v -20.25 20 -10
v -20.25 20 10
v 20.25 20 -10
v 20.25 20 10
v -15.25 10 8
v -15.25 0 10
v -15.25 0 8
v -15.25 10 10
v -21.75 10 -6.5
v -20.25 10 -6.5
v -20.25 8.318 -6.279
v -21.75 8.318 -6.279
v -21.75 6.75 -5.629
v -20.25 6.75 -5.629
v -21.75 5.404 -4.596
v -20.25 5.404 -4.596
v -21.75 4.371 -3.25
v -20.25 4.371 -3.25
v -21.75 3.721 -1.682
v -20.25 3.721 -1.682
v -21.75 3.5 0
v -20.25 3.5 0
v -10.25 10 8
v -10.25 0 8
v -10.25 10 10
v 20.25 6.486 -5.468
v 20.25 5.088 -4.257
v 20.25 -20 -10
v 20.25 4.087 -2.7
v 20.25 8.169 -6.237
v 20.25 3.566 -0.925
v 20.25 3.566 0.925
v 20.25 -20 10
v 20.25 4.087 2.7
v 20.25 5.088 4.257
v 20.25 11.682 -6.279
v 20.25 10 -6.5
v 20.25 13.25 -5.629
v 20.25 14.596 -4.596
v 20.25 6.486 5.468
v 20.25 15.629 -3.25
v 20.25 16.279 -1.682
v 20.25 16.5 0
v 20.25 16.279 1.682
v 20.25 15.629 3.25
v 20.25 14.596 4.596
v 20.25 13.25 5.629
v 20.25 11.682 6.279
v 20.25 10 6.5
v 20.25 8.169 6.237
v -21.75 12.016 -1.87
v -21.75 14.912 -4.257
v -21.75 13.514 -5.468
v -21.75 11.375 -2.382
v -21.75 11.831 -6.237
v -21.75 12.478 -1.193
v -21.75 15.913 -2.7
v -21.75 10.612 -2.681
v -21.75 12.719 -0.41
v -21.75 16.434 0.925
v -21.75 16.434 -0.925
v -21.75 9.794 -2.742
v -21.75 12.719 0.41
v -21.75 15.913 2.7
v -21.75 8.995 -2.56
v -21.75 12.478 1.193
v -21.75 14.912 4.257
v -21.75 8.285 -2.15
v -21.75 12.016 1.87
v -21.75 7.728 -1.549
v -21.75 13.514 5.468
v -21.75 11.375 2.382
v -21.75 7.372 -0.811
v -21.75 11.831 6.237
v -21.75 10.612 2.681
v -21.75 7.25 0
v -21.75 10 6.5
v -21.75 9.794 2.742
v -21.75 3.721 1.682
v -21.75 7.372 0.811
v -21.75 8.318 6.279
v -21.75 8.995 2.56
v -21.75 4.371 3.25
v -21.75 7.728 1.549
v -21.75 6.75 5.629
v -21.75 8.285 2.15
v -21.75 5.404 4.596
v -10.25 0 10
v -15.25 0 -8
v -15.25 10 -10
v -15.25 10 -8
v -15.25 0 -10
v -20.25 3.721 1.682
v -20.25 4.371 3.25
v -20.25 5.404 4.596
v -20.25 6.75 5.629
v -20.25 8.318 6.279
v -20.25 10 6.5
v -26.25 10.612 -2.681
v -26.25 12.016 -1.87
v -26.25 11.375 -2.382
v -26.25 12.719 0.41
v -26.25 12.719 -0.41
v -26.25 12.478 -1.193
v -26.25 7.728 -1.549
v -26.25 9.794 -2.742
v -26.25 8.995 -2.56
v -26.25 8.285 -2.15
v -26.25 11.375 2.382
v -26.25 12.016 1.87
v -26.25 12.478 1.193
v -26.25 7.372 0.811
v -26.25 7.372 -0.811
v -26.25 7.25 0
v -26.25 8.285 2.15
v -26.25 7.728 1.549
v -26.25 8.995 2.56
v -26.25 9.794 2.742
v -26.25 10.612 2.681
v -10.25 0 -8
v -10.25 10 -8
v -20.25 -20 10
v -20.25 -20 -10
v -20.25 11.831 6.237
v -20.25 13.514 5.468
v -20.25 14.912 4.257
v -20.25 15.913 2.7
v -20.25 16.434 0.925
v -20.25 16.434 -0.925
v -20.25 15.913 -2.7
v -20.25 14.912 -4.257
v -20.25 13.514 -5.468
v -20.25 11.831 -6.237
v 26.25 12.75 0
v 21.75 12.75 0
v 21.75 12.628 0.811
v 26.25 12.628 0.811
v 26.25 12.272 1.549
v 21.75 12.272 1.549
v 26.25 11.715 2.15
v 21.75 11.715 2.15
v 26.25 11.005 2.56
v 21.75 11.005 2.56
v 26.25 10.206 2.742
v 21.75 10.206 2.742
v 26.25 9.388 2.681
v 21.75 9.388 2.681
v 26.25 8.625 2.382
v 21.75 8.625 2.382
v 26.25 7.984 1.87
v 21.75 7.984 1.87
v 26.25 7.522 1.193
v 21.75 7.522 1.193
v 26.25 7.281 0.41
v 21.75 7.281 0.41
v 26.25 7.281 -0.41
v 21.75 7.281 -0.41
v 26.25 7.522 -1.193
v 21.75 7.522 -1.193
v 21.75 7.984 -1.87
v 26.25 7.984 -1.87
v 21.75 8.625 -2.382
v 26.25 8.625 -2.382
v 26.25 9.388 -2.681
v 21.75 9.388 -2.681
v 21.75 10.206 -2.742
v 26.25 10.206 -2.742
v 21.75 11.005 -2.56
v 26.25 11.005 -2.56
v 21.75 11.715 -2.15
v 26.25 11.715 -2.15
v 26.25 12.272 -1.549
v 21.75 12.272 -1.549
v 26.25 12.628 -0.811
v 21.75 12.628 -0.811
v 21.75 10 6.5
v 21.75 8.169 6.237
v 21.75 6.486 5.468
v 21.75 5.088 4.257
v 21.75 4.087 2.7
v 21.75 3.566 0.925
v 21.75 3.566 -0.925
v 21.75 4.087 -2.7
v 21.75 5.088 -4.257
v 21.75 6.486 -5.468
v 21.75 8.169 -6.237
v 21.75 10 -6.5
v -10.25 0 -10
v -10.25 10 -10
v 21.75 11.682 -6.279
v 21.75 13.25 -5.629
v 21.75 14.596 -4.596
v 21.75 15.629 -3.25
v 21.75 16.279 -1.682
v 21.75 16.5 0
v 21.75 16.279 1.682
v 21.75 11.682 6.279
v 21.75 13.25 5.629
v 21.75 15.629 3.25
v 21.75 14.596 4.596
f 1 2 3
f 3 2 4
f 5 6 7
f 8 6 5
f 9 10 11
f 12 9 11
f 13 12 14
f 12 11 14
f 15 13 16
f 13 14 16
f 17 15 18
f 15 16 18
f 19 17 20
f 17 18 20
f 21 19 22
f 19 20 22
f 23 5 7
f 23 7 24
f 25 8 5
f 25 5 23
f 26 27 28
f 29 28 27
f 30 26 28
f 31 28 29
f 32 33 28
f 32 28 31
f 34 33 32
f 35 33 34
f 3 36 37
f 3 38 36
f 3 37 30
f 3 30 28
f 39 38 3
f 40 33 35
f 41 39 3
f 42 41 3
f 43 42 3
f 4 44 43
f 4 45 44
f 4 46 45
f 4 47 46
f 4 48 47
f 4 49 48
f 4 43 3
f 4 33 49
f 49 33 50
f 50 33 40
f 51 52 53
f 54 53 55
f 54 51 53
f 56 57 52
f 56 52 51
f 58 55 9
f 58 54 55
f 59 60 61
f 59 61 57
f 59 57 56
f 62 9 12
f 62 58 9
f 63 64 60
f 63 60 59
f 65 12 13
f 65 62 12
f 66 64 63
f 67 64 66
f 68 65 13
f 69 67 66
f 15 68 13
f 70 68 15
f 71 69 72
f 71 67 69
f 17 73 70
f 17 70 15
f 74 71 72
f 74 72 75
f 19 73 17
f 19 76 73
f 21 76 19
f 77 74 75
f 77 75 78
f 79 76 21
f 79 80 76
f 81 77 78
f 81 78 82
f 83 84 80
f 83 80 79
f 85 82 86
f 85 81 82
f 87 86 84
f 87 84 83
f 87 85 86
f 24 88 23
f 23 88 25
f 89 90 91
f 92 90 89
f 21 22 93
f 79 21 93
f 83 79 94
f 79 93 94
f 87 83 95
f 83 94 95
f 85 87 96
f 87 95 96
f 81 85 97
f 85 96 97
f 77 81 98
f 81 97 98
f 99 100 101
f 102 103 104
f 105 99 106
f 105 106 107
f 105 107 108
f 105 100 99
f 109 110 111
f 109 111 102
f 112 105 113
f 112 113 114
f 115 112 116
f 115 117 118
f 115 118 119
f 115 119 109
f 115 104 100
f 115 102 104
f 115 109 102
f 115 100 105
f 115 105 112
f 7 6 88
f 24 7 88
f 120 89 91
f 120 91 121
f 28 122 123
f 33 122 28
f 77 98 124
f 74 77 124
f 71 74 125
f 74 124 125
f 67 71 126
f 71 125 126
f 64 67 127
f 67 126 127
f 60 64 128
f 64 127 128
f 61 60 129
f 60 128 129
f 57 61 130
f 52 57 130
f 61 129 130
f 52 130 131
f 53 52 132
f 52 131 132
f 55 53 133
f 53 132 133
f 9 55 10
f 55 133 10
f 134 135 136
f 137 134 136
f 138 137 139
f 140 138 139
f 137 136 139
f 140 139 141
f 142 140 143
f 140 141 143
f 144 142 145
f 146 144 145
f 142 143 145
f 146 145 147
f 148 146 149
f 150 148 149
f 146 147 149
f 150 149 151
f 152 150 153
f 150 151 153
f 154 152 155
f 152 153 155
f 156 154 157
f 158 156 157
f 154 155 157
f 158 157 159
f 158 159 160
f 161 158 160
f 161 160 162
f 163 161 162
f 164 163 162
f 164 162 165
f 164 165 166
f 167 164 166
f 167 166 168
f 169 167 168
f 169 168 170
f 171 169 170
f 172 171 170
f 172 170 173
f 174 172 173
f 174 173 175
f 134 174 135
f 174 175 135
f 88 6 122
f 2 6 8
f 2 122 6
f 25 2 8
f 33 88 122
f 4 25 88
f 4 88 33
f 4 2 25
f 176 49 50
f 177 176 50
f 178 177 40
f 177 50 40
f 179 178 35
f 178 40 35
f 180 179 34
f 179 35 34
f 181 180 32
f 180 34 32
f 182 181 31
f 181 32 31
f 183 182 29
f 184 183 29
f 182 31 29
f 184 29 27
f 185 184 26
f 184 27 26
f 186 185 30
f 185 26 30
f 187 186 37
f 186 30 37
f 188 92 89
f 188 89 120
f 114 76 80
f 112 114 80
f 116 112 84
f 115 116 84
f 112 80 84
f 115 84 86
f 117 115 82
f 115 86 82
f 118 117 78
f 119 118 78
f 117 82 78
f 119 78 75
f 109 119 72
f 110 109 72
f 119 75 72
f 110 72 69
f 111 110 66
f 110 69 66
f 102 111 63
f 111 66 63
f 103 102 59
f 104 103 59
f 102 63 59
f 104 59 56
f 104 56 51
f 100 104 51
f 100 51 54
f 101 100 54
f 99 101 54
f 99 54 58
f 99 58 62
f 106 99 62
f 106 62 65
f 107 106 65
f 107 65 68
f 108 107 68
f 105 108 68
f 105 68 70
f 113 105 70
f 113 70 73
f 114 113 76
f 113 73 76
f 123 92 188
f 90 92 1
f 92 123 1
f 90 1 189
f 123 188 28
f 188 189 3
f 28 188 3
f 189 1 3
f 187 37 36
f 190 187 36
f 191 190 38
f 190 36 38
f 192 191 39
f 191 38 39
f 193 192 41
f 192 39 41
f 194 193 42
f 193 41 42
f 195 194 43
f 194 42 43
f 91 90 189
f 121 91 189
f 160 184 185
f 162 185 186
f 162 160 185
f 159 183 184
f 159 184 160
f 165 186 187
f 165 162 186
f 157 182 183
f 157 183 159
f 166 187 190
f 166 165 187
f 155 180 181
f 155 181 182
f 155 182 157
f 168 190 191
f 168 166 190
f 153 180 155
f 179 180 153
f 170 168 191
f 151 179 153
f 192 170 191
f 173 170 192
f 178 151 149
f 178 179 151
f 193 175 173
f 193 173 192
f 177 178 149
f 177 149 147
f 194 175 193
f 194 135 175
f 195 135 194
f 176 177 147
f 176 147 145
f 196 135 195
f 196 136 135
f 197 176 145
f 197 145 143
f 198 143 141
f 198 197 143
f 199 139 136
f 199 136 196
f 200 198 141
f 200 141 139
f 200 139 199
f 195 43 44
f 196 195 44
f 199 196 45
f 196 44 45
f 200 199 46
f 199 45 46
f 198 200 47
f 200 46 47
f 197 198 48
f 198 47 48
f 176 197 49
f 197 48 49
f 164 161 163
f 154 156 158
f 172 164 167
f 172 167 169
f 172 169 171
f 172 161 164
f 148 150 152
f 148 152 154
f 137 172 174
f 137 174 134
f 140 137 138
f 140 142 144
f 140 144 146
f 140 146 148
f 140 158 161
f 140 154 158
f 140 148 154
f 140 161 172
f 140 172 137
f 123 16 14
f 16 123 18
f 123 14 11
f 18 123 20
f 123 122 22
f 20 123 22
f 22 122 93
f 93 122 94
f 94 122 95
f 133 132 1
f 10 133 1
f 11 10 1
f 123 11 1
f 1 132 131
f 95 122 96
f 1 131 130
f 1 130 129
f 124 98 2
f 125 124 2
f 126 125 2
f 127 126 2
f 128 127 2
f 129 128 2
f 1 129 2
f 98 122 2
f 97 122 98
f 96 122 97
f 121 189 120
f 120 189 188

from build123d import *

# Parameters (mm, degrees)
F0_W      = 40.5
F0_H      = 40
F1_DEPTH  = 10
F3_DEPTH  = 1.5
F4_R      = 2.75
F5_DEPTH  = 4.5
F7_DEPTH  = 1.5
F8_R      = 2.75
F9_DEPTH  = 4.5
F10_W     = 5
F10_H     = 10
F11_DEPTH = 2
F12_W     = 5
F12_H     = 10
F13_DEPTH = 2


with BuildPart() as f1:
    # F0 (on Top) → F1 (new body, symmetric)
    with BuildSketch(Plane.XY):
        Rectangle(F0_W, F0_H)
    extrude(amount=F1_DEPTH, both=True)

    # F2 (on face) → F3 (join)
    with BuildSketch(Plane(origin=(-20.25, 0, 0), x_dir=(0, -1, 0), z_dir=(-1, 0, 0))):
        with BuildLine():
            Line((-10, -6.5), (-10, 6.5))
            ThreePointArc((-10, 6.5), (-16.5, 0), (-10, -6.5))
        make_face()
        with BuildLine():
            ThreePointArc((-3.5, 0), (-5.4038059223, 4.5961940777), (-10, 6.5))
            Line((-10, 6.5), (-10, -6.5))
            ThreePointArc((-10, -6.5), (-5.4038059223, -4.5961940777), (-3.5, 0))
        make_face()
    extrude(amount=F3_DEPTH)

    # F4 (on face) → F5 (join)
    with BuildSketch(Plane(origin=(-21.75, 0, 0), x_dir=(0, -1, 0), z_dir=(-1, 0, 0))):
        with Locations((-10, 0)):
            Circle(F4_R)
    extrude(amount=F5_DEPTH)

    # F6 (on face) → F7 (join)
    with BuildSketch(Plane.YZ.offset(20.25)):
        with BuildLine():
            ThreePointArc((16.5, 0), (14.5961940777, 4.5961940777), (10, 6.5))
            Line((10, 6.5), (10, -6.5))
            ThreePointArc((10, -6.5), (14.5961940777, -4.5961940777), (16.5, 0))
        make_face()
        with BuildLine():
            Line((10, -6.5), (10, 6.5))
            ThreePointArc((10, 6.5), (3.5, 0), (10, -6.5))
        make_face()
    extrude(amount=F7_DEPTH)

    # F8 (on face) → F9 (join)
    with BuildSketch(Plane.YZ.offset(21.75)):
        with Locations((10, 0)):
            Circle(F8_R)
    extrude(amount=F9_DEPTH)

    # F10 (on face) → F11 (cut)
    with BuildSketch(Plane(origin=(0, 0, -10), x_dir=(1, 0, 0), z_dir=(0, 0, -1))):
        with Locations((-12.75, -5)):
            Rectangle(F10_W, F10_H)
    extrude(amount=-F11_DEPTH, mode=Mode.SUBTRACT)

    # F12 (on face) → F13 (cut)
    with BuildSketch(Plane.XY.offset(10)):
        with Locations((-12.75, 5)):
            Rectangle(F12_W, F12_H)
    extrude(amount=-F13_DEPTH, mode=Mode.SUBTRACT)


solid = f1.part
